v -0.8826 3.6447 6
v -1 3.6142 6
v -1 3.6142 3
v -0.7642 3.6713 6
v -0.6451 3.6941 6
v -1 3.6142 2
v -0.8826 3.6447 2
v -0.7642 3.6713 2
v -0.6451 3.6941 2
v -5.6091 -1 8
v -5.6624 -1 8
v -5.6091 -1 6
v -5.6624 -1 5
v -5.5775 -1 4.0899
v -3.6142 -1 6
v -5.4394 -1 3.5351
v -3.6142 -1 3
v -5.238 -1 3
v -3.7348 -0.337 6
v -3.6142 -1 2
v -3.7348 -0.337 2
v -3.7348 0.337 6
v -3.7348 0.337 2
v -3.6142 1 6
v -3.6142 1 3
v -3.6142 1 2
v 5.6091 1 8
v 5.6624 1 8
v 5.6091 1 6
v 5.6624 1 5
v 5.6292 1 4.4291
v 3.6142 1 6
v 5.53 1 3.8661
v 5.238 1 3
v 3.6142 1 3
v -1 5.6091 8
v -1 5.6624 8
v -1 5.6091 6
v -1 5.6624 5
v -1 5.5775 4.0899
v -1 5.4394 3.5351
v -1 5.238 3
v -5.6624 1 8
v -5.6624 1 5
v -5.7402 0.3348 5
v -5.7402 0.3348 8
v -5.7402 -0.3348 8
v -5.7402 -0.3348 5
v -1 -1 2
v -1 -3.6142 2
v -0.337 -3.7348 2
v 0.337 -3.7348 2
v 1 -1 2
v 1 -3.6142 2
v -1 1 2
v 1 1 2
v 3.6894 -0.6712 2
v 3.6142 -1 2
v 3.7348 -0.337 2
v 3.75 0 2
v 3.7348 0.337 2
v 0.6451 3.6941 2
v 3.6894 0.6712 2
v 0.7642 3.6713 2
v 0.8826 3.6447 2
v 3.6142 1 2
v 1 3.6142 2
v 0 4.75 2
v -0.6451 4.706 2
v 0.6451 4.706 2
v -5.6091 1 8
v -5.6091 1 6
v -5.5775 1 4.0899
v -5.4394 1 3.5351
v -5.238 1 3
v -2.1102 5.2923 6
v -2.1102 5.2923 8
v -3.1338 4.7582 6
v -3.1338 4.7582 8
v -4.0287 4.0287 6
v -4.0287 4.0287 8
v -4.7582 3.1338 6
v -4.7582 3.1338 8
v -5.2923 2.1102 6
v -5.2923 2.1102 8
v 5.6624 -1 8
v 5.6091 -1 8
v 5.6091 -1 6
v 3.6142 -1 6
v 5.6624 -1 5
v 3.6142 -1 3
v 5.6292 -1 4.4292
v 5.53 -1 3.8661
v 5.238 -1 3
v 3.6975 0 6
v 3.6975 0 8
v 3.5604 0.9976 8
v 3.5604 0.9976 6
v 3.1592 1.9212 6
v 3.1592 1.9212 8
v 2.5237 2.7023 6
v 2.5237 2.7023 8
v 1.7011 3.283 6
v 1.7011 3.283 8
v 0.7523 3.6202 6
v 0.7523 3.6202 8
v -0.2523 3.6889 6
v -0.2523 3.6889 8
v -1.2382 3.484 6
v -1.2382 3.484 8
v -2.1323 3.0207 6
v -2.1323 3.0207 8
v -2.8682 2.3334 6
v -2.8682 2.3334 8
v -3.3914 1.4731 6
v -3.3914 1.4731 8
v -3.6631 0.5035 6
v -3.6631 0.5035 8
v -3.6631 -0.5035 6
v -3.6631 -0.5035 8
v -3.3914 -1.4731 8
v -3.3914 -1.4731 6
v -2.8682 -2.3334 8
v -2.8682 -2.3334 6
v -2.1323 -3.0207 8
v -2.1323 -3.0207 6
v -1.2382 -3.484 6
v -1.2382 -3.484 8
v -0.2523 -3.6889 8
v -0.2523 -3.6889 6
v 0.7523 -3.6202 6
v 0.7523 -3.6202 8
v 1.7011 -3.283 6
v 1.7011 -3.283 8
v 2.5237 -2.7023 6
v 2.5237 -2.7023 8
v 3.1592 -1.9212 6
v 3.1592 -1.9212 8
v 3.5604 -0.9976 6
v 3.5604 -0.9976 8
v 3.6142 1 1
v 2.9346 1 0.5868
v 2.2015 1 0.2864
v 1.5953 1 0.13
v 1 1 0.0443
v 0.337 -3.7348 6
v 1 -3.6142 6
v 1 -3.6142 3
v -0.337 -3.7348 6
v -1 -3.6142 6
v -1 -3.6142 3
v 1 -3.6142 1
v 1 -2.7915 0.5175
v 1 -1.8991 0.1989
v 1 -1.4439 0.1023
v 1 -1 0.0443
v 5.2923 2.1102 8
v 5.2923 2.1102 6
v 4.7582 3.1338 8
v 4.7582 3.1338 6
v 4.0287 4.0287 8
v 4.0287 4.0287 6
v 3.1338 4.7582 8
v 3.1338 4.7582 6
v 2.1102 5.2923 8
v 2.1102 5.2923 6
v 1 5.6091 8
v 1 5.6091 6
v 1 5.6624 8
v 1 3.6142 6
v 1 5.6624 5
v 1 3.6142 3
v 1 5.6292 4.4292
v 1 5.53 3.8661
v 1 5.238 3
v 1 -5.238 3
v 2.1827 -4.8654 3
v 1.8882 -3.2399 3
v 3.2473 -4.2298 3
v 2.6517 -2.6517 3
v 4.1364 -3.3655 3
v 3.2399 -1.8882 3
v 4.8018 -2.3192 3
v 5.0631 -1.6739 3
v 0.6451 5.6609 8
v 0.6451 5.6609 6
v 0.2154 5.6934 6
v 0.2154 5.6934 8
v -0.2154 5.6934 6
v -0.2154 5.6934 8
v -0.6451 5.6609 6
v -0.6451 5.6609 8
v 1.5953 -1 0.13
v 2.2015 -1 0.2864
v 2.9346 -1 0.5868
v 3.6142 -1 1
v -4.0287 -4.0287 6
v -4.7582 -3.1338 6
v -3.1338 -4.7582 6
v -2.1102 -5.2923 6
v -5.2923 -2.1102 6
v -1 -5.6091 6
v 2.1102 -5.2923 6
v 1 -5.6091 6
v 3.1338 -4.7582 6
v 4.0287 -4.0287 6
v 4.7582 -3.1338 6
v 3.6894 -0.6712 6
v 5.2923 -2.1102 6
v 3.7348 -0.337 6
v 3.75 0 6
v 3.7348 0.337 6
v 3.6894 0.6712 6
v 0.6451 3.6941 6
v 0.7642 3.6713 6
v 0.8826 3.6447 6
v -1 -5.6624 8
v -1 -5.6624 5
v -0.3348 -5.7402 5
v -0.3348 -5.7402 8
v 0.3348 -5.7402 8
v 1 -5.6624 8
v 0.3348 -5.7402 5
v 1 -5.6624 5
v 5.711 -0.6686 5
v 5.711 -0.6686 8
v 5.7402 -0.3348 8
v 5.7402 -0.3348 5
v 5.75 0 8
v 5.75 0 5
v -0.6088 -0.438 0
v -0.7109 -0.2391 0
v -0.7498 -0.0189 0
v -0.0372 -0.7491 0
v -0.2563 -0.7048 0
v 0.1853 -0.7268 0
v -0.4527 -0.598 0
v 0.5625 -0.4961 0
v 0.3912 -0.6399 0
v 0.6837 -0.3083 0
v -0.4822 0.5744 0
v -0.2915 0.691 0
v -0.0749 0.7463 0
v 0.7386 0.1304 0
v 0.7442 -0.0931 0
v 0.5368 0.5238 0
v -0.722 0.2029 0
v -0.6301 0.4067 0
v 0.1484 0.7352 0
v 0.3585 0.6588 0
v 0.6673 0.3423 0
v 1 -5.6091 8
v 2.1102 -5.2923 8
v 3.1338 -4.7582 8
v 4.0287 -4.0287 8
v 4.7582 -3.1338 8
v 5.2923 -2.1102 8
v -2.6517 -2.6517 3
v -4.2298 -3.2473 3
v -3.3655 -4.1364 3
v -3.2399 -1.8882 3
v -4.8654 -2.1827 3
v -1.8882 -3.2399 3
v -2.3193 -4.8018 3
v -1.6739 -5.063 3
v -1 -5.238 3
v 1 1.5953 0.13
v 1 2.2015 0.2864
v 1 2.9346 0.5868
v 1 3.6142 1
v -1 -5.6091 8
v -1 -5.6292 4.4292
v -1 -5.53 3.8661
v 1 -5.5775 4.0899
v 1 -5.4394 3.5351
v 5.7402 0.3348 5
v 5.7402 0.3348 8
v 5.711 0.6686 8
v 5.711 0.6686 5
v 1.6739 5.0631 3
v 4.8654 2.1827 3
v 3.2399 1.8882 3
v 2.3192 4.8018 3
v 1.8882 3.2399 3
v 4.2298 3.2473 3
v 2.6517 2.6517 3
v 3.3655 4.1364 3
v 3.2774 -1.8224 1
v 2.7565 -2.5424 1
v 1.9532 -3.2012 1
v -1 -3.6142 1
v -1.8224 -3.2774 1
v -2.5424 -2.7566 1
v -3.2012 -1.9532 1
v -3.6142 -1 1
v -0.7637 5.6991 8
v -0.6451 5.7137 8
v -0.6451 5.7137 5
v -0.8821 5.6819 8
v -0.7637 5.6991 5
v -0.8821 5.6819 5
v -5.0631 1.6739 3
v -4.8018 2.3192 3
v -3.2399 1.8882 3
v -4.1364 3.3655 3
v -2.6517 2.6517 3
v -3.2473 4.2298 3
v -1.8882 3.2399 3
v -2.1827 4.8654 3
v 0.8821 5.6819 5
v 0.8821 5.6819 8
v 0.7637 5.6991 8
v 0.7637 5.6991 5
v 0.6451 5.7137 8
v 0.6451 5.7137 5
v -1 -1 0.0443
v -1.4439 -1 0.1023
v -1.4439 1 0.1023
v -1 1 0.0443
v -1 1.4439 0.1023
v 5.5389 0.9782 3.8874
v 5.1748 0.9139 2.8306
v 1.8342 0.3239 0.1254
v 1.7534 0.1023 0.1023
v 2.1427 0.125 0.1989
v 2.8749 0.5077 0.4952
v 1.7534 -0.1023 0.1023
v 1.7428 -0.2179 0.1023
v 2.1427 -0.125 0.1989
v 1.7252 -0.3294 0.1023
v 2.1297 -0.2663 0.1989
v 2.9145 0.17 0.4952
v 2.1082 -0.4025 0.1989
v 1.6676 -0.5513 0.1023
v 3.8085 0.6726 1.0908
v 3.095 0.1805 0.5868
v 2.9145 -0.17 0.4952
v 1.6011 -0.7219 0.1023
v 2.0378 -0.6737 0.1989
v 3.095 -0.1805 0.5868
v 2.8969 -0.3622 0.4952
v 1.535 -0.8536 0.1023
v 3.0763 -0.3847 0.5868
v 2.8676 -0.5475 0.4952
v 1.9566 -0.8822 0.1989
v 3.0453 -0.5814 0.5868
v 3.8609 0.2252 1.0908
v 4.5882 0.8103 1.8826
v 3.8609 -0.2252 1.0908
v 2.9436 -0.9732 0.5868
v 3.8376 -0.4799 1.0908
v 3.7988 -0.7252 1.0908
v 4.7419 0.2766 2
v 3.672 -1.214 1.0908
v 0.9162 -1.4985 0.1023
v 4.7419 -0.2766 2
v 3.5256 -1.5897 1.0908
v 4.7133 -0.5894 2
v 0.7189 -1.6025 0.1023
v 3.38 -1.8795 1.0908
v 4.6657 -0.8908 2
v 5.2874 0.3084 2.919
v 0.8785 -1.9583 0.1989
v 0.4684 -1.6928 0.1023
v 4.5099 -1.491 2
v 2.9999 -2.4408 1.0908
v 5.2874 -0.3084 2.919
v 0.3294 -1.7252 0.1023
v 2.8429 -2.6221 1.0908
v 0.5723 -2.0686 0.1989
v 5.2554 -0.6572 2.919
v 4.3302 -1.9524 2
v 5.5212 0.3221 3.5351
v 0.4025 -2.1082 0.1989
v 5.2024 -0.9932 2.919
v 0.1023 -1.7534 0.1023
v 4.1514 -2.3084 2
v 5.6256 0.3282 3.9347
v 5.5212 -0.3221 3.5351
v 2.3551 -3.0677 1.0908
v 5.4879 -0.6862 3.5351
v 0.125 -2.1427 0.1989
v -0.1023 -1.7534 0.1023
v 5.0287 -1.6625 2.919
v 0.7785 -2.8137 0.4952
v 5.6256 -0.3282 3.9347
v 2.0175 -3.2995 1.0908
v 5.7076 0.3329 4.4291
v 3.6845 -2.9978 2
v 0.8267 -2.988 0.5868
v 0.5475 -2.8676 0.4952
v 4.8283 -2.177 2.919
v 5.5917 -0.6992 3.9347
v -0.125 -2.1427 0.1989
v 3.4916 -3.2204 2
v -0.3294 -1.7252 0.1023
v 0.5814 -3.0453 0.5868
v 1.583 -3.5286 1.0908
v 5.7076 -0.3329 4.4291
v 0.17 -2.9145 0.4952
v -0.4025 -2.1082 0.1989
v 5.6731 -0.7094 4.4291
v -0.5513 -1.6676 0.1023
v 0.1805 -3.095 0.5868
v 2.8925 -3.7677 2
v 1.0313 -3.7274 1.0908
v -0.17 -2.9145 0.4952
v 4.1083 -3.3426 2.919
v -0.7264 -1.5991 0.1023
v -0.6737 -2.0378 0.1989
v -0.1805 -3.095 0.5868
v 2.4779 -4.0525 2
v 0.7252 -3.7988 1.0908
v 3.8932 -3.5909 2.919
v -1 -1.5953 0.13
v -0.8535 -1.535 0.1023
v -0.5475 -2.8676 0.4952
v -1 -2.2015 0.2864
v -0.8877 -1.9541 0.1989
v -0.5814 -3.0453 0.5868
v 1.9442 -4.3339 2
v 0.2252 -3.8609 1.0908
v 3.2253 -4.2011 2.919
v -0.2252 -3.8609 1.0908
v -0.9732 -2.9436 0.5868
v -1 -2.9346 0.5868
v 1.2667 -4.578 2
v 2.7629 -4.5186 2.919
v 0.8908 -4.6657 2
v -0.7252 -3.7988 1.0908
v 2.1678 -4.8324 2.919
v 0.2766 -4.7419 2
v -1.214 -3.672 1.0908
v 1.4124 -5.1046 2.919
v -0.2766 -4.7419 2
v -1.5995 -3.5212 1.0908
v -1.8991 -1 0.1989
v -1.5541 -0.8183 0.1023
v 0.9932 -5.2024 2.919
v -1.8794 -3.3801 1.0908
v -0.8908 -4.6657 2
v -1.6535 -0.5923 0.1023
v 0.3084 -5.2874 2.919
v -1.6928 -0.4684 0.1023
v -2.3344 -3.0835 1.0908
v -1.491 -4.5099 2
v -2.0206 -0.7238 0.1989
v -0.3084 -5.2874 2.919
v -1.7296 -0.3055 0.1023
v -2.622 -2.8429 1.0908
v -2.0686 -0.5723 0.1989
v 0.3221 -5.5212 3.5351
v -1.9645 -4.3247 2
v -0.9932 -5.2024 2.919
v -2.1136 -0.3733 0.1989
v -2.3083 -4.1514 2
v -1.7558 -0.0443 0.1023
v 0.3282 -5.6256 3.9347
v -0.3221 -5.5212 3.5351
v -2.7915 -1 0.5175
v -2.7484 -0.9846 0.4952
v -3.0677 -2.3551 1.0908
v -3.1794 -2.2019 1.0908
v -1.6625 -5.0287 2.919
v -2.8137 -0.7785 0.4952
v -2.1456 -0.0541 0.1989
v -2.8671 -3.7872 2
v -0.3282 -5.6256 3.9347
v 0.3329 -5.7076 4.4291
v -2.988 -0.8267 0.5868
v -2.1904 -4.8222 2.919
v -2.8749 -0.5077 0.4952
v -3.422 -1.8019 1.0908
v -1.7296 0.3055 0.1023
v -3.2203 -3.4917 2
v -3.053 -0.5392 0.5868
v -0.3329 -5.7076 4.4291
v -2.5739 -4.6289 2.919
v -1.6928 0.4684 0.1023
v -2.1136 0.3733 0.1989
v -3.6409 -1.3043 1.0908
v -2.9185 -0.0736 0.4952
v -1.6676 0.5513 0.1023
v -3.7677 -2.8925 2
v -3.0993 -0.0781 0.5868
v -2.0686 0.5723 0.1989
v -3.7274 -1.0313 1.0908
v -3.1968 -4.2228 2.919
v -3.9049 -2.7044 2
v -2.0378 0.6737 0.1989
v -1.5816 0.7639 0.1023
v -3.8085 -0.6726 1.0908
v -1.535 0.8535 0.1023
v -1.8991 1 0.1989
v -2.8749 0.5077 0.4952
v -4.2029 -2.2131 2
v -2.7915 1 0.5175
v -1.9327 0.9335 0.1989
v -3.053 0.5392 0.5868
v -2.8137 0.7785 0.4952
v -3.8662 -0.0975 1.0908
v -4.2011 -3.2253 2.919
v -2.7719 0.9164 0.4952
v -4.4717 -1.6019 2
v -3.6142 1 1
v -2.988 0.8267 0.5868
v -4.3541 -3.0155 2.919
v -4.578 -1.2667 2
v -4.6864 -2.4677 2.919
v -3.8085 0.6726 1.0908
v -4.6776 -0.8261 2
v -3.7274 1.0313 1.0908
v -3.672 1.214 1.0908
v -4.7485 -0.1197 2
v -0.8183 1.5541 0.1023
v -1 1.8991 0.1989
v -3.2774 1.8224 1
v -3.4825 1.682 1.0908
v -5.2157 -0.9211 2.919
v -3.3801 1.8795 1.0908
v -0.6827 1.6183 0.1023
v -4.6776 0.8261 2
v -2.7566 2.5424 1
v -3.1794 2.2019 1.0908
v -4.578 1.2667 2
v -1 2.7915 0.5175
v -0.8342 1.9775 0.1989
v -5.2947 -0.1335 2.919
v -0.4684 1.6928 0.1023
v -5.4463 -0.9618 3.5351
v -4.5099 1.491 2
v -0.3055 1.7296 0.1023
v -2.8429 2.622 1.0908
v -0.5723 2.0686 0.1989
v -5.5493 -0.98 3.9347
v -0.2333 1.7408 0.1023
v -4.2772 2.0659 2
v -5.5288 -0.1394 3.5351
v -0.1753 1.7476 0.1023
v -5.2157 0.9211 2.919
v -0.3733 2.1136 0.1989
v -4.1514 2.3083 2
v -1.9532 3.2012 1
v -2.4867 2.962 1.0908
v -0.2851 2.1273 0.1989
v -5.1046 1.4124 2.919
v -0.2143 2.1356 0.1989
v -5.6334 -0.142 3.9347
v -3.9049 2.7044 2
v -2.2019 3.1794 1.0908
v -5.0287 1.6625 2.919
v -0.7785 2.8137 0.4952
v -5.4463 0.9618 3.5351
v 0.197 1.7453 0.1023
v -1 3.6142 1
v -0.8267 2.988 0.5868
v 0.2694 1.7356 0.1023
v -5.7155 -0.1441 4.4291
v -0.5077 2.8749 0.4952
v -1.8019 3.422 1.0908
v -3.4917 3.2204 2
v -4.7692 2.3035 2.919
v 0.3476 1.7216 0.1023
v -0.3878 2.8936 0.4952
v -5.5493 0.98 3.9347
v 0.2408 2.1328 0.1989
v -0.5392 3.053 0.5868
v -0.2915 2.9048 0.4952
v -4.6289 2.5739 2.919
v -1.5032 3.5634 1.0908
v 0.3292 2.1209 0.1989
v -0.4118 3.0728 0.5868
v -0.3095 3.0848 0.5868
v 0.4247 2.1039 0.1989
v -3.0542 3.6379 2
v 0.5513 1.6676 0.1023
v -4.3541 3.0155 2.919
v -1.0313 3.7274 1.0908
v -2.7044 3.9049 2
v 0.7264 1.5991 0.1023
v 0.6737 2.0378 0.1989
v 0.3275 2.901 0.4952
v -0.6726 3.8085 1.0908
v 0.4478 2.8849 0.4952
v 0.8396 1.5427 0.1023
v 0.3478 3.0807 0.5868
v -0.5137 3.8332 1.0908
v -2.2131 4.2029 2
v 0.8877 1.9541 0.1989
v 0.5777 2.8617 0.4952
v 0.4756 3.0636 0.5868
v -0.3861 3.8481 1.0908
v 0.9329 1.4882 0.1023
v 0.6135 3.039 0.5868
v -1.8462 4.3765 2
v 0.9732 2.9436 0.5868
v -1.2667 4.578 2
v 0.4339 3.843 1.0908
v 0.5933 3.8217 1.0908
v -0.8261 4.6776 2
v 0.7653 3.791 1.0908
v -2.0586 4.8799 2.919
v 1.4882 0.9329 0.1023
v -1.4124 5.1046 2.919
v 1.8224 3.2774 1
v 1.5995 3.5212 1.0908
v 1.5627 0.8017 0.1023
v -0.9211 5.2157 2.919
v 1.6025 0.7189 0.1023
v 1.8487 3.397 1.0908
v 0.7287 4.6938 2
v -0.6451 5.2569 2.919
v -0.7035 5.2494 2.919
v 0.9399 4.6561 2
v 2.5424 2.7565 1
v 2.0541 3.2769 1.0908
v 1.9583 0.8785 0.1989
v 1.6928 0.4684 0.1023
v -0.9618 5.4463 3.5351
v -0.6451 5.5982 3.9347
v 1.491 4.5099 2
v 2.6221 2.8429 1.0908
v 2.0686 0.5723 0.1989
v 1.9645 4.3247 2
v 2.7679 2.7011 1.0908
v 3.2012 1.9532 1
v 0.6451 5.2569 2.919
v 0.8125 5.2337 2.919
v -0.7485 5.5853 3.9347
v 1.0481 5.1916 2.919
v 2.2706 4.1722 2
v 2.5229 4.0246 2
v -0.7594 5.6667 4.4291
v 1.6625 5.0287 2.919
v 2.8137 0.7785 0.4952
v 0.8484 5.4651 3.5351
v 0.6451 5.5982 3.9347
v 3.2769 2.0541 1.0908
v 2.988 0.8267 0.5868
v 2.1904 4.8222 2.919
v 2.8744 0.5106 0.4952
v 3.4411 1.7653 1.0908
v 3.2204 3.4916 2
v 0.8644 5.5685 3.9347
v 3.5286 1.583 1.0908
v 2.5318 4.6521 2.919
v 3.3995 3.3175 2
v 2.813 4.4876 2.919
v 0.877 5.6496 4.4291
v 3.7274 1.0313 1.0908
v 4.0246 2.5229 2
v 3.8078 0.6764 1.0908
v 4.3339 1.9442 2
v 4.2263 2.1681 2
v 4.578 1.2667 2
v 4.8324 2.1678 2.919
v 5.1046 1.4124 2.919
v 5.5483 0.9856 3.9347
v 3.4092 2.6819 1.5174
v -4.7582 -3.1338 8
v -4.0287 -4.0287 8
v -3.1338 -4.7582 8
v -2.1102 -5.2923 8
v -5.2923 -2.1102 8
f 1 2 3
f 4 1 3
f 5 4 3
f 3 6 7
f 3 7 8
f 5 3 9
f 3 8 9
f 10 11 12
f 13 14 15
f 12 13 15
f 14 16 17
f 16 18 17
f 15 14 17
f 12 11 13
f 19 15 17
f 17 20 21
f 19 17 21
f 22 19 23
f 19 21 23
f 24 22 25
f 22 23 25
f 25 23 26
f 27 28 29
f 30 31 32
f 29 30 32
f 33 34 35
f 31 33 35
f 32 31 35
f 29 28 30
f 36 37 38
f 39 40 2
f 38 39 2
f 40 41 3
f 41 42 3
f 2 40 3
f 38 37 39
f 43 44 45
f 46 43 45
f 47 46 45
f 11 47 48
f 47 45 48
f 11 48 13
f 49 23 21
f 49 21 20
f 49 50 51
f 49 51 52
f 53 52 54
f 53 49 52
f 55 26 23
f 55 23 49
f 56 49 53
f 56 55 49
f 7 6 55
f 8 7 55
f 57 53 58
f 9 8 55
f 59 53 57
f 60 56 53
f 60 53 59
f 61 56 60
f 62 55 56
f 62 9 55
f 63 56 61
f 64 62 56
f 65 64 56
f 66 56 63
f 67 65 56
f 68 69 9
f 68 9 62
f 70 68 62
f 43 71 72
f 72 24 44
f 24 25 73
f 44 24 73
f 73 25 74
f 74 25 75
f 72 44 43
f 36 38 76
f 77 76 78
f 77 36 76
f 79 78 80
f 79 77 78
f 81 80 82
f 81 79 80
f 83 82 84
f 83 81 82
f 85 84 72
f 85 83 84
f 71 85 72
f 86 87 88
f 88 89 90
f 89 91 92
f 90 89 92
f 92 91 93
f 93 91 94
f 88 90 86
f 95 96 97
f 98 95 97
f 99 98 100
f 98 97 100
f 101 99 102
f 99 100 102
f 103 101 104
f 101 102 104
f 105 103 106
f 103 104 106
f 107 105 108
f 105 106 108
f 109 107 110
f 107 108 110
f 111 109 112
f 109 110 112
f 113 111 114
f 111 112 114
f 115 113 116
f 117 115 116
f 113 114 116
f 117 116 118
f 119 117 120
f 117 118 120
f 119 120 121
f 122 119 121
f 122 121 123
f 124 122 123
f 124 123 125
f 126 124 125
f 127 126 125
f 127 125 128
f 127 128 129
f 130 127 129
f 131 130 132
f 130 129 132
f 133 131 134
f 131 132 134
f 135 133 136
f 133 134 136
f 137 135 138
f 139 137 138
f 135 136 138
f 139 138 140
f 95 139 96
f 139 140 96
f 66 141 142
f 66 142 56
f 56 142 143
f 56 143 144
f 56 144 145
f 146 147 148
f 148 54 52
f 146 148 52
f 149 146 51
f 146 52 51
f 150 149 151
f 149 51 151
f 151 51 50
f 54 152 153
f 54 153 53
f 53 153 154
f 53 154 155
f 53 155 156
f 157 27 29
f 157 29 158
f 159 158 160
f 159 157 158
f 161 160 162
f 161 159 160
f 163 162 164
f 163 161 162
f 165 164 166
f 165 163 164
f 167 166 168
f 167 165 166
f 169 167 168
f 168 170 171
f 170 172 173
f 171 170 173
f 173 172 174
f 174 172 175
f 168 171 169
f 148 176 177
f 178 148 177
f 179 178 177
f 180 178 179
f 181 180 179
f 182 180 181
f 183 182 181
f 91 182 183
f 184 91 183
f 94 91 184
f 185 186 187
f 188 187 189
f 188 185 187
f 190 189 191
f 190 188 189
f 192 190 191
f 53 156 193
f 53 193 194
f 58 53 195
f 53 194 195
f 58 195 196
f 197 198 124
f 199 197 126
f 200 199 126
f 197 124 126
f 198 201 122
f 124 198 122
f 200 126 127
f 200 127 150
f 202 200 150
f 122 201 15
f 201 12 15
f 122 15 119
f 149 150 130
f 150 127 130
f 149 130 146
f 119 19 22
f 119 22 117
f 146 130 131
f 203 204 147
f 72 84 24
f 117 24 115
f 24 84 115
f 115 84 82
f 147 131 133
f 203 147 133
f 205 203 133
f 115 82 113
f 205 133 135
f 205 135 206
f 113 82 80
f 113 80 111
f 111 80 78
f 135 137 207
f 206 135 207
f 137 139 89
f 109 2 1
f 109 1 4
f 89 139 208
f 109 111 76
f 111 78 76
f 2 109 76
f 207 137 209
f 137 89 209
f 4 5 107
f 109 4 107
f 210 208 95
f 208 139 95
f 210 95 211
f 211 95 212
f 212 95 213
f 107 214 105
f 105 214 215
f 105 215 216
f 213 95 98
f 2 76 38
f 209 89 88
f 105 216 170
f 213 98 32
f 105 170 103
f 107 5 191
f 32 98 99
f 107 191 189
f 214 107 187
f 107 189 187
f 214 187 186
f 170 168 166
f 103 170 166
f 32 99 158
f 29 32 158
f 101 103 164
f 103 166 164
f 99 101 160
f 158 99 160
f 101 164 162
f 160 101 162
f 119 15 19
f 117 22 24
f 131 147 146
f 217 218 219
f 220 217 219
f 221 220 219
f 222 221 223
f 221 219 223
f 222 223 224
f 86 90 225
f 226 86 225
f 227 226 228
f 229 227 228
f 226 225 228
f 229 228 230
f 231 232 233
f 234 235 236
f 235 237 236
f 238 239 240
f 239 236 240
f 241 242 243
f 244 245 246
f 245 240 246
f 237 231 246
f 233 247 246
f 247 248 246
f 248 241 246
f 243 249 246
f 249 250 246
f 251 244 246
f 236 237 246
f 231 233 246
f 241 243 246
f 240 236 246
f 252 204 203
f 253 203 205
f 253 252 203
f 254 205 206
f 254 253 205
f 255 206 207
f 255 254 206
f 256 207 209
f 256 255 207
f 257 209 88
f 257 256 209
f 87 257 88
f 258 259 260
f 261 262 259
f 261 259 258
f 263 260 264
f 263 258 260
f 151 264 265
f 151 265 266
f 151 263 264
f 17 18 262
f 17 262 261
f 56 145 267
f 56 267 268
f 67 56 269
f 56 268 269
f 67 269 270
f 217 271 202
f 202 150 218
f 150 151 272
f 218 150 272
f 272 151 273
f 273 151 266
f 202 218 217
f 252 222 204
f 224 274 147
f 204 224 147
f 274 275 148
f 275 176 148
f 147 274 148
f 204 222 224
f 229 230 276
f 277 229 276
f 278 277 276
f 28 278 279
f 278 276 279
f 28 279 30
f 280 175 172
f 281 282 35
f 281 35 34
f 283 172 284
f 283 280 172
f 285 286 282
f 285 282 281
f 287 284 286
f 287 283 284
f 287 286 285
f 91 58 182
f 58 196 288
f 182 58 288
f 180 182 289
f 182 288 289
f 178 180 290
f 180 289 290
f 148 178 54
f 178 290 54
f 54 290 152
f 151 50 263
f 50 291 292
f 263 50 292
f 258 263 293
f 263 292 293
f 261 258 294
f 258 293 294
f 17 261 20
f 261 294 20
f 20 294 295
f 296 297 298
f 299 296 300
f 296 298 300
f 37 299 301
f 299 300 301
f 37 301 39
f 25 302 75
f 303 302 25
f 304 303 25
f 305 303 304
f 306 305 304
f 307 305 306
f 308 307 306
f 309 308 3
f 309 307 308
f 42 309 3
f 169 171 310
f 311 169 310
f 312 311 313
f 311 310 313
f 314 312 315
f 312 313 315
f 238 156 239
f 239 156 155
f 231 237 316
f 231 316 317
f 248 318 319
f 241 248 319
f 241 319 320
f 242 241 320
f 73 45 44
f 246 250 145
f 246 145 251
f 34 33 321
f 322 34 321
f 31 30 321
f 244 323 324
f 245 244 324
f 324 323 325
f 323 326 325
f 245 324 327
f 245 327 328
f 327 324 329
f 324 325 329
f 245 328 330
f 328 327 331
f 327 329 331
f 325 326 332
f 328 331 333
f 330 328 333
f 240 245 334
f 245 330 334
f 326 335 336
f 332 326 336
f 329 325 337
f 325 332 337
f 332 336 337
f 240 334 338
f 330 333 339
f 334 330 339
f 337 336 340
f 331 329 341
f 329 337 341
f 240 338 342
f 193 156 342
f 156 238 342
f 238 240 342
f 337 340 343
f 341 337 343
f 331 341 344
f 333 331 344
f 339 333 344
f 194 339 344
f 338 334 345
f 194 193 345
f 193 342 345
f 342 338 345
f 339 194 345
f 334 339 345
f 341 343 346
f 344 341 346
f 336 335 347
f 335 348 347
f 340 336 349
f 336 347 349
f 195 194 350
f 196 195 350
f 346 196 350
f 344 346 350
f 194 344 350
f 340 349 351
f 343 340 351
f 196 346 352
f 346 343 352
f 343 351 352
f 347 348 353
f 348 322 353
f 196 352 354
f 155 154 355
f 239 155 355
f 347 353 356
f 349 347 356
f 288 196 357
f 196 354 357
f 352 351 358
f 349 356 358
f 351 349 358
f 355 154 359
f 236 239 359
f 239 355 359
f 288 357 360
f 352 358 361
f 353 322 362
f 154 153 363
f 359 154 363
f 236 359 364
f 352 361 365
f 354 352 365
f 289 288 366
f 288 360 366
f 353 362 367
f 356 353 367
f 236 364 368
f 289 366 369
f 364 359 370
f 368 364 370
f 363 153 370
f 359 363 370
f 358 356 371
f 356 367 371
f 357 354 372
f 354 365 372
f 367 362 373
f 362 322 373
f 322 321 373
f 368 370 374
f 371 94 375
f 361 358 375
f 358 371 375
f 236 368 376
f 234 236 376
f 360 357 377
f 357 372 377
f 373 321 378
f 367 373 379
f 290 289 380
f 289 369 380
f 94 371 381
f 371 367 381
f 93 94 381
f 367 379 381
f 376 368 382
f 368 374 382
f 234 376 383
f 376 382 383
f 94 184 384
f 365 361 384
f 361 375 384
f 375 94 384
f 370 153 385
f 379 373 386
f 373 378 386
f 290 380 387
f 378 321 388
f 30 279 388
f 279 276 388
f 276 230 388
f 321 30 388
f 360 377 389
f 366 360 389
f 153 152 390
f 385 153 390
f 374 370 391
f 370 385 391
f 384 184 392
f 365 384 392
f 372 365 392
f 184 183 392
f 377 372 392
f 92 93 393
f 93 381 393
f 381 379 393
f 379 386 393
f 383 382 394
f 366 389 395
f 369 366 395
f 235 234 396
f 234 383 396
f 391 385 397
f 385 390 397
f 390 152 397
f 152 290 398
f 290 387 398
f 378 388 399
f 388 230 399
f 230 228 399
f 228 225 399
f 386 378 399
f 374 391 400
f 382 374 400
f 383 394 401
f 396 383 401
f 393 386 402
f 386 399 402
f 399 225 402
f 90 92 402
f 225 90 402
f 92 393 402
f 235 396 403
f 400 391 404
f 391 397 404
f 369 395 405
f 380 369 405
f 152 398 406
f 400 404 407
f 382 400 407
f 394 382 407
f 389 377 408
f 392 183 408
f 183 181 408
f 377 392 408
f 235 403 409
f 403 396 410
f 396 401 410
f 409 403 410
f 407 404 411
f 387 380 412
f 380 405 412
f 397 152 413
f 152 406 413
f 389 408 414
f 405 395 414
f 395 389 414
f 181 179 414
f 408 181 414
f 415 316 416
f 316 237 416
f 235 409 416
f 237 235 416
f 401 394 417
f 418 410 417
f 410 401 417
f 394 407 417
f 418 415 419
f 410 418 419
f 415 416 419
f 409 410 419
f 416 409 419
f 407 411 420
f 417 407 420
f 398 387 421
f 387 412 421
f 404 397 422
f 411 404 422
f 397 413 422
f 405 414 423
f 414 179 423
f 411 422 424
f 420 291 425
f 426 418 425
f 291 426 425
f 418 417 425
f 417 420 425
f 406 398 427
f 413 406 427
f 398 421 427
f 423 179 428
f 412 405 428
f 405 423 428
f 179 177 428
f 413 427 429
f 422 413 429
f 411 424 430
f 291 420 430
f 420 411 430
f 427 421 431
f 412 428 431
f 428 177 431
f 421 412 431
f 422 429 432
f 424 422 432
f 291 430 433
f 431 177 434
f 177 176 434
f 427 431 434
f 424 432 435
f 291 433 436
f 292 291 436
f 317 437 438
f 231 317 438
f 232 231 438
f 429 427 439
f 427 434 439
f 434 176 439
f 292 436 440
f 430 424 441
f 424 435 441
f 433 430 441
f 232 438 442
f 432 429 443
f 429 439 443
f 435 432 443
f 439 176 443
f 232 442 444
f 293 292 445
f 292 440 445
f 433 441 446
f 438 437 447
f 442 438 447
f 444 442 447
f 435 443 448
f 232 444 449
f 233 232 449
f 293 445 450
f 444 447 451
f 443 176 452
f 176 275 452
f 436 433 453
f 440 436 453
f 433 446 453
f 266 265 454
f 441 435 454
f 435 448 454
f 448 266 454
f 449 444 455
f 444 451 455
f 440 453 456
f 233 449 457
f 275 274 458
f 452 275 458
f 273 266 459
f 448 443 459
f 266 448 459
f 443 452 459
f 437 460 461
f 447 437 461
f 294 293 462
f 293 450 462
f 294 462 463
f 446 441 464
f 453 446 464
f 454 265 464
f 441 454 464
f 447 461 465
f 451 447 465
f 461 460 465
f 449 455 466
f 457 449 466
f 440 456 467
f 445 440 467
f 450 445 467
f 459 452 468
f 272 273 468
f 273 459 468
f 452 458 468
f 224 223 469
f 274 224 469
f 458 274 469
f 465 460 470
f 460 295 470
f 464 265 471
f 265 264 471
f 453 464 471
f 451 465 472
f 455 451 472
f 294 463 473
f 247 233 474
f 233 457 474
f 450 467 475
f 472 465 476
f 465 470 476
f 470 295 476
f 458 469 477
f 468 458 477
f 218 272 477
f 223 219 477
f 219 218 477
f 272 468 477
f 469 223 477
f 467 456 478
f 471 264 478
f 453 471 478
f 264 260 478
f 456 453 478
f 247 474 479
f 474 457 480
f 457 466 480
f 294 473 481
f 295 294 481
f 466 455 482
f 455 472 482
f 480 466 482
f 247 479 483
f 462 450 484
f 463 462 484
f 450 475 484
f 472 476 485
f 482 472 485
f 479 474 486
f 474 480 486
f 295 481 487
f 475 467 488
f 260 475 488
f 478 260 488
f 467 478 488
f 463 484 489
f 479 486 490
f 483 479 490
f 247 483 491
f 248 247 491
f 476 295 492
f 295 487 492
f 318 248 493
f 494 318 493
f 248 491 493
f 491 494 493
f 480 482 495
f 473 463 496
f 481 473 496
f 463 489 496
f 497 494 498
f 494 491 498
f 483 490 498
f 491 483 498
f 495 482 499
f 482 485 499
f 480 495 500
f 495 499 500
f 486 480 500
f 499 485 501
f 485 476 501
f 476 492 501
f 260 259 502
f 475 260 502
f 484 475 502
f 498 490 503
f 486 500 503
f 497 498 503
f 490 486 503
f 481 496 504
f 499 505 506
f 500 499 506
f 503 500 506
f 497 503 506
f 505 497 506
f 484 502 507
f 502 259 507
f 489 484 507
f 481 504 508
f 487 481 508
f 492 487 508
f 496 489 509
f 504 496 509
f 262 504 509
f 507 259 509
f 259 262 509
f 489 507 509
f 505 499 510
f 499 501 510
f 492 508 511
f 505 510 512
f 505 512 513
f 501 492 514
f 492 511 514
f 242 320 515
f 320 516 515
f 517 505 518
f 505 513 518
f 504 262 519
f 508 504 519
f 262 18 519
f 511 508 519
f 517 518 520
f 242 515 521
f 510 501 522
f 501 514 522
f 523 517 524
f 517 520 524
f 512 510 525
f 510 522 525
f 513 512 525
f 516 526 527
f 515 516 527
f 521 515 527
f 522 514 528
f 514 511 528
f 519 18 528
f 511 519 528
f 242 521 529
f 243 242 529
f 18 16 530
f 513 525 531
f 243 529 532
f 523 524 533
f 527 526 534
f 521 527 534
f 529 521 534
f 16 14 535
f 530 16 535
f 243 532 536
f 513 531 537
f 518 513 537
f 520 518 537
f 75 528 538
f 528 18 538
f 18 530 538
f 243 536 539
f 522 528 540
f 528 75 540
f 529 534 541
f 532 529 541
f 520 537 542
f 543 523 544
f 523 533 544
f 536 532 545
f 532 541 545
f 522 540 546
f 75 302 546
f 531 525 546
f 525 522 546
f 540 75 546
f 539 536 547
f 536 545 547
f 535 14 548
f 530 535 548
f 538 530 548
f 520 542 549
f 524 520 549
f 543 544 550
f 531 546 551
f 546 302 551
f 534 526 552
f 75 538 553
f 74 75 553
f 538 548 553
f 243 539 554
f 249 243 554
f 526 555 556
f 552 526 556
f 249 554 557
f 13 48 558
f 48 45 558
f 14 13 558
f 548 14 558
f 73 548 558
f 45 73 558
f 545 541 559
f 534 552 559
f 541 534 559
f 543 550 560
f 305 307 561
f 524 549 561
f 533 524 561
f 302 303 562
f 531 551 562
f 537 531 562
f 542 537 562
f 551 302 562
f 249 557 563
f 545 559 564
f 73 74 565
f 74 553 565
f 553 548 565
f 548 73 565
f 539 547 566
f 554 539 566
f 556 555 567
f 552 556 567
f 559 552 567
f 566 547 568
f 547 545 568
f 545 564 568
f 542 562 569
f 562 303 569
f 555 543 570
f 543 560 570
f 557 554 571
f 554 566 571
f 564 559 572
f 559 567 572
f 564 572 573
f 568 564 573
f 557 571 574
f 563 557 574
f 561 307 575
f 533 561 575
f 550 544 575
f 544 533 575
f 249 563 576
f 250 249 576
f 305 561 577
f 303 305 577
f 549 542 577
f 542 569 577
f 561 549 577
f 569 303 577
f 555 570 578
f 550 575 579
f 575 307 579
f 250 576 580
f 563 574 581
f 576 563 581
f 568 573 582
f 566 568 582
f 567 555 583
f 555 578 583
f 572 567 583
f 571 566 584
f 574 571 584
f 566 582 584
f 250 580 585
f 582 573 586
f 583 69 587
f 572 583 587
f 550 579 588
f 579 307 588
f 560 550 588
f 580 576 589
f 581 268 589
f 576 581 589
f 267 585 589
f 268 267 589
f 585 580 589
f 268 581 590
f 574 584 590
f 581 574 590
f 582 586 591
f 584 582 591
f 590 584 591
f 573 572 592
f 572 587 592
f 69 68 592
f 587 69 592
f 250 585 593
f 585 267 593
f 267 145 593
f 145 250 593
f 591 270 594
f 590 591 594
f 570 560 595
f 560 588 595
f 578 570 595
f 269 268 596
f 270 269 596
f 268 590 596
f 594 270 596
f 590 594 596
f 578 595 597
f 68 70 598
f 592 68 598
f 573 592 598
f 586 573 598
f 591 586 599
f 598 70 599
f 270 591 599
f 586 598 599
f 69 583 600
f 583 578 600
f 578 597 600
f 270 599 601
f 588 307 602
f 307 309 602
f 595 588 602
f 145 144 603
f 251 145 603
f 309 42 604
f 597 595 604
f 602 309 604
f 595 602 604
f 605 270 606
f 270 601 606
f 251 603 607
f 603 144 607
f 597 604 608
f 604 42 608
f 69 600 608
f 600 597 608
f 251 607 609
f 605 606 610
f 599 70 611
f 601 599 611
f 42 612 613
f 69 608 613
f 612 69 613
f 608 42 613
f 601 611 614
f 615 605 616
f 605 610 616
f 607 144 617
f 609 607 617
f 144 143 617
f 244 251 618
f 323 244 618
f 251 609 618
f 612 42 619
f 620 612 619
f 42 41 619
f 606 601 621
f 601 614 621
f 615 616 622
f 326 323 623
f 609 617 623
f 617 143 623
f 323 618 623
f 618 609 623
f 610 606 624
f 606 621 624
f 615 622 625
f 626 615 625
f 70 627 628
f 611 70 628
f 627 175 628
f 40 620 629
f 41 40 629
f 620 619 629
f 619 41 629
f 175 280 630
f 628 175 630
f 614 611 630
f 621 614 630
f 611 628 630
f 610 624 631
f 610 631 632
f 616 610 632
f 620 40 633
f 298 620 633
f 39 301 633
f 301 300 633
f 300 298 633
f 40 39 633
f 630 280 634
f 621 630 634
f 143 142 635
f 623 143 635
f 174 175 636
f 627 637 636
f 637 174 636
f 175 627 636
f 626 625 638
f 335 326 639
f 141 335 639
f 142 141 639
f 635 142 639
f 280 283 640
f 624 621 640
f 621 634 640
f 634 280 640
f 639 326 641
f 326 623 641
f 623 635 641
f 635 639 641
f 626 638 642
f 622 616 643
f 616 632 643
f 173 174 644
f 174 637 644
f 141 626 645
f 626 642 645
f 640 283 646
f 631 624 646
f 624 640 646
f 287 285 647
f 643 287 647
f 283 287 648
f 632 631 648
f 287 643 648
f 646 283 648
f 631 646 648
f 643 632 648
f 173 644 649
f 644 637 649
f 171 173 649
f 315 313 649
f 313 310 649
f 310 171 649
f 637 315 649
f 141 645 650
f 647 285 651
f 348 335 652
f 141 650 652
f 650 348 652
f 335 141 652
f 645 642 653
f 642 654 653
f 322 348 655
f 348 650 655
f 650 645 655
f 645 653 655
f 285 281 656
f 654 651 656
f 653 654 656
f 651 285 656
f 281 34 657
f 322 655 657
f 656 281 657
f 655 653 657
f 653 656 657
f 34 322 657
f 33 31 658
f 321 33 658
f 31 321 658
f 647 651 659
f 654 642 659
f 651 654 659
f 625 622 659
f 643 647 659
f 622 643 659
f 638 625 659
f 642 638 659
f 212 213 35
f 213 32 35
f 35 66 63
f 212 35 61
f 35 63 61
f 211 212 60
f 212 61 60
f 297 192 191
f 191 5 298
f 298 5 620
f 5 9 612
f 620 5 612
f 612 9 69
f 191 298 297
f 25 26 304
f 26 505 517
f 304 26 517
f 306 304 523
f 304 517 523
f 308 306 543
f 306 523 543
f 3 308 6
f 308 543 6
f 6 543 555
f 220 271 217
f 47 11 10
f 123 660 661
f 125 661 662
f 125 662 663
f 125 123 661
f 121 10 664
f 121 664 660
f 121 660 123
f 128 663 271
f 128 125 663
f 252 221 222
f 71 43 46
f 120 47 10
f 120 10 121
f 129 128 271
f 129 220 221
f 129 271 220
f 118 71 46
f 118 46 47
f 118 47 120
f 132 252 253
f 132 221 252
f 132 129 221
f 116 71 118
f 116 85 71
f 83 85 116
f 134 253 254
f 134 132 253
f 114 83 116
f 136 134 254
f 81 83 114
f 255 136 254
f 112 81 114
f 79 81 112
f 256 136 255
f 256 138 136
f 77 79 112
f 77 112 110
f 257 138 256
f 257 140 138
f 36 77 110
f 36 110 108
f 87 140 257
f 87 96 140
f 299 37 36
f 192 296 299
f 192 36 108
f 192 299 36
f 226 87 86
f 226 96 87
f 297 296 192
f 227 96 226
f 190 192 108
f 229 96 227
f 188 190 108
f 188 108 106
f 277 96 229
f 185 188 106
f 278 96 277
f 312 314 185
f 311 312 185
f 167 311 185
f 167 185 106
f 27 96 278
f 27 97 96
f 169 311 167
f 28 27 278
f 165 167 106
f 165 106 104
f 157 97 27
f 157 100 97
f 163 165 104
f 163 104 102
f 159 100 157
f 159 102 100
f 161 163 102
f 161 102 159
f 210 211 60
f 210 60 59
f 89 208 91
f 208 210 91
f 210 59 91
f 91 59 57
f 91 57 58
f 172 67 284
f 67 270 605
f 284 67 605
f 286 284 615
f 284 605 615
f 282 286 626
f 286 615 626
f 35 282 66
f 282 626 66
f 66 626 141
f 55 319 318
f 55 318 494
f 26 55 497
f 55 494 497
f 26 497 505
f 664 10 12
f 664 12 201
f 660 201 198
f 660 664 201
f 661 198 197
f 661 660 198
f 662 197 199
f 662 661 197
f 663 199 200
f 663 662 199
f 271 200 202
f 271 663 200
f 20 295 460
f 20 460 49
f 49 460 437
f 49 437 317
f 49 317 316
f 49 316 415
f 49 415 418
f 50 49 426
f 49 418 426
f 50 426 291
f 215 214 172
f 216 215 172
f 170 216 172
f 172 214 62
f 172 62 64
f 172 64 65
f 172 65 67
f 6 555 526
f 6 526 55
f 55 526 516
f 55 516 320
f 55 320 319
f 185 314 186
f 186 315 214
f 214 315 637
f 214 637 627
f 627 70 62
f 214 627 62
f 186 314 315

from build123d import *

# Parameters (mm, degrees)
F1_DEPTH = 3
F2_DEPTH = 8
F0_W     = 2
F0_H     = 2
F3_DEPTH = 2
F4_R     = 3.6974991887
F5_DEPTH = 2


# Not quite as in the source:
# - a fillet or chamfer that OpenCascade refuses, or shapes differently, is made with other operations: its cross-section is extruded or revolved along the edge and cut away or added


with BuildPart() as f1:
    # F0 (on Top) → F1 (new body)
    with BuildSketch(Plane.XY):
        with BuildLine():
            Line((3.7669987963, -1), (3.6142080737, -1))
            ThreePointArc((3.6142080737, -1), (2.6516504294, -2.6516504294), (1, -3.6142080737))
            Line((1, -3.6142080737), (1, -5.6623758265))
            ThreePointArc((1, -5.6623758265), (4.0658639918, -4.0658639918), (5.6623758265, -1))
            Line((5.6623758265, -1), (3.7669987963, -1))
        make_face()
    extrude(amount=F1_DEPTH)



with BuildPart() as f1b:
    # F0 (on Top) → F1, piece 2 (new body)
    with BuildSketch(Plane.XY):
        with BuildLine():
            Line((-1, -5.6623758265), (-1, -3.6142080737))
            ThreePointArc((-1, -3.6142080737), (-2.6516504294, -2.6516504294), (-3.6142080737, -1))
            Line((-3.6142080737, -1), (-5.6623758265, -1))
            ThreePointArc((-5.6623758265, -1), (-4.0658639918, -4.0658639918), (-1, -5.6623758265))
        make_face()
    extrude(amount=F1_DEPTH)


with BuildPart() as f1c:
    # F0 (on Top) → F1, piece 3 (new body)
    with BuildSketch(Plane.XY):
        with BuildLine():
            ThreePointArc((-3.6142080737, 1), (-2.6516504294, 2.6516504294), (-1, 3.6142080737))
            Line((-1, 3.6142080737), (-1, 5.6623758265))
            ThreePointArc((-1, 5.6623758265), (-4.0658639918, 4.0658639918), (-5.6623758265, 1))
            Line((-5.6623758265, 1), (-3.6142080737, 1))
        make_face()
    extrude(amount=F1_DEPTH)


with BuildPart() as f1d:
    # F0 (on Top) → F1, piece 4 (new body)
    with BuildSketch(Plane.XY):
        with BuildLine():
            ThreePointArc((1, 3.6142080737), (2.6516504294, 2.6516504294), (3.6142080737, 1))
            Line((3.6142080737, 1), (5.6623758265, 1))
            ThreePointArc((5.6623758265, 1), (4.0658639918, 4.0658639918), (1, 5.6623758265))
            Line((1, 5.6623758265), (1, 3.6142080737))
        make_face()
    extrude(amount=F1_DEPTH)


with BuildPart() as f1_1:
    add(f1.part)

    add(f1b.part)  # F2 merges F1b

    add(f1c.part)  # F2 merges F1c

    add(f1d.part)  # F2 merges F1d
    # F0 (on Top) → F2 (join)
    with BuildSketch(Plane.XY):
        with BuildLine():
            ThreePointArc((0.6450651563, 3.6941021838), (0.8235020396, 3.6584620253), (1, 3.6142080737))
            Line((1, 3.6142080737), (1, 5.6623758265))
            ThreePointArc((1, 5.6623758265), (0.8229328266, 5.6908067585), (0.6450651563, 5.7137020349))
            Line((0.6450651563, 5.7137020349), (0.6450651563, 3.6941021838))
        make_face()
        with BuildLine():
            ThreePointArc((-1, 3.6142080737), (-0.8235020396, 3.6584620253), (-0.6450651563, 3.6941021838))
            Line((-0.6450651563, 3.6941021838), (-0.6450651563, 5.7137020349))
            ThreePointArc((-0.6450651563, 5.7137020349), (-0.8229328266, 5.6908067585), (-1, 5.6623758265))
            Line((-1, 5.6623758265), (-1, 3.6142080737))
        make_face()
        with BuildLine():
            ThreePointArc((-3.6142080737, -1), (-3.75, 0), (-3.6142080737, 1))
            Line((-3.6142080737, 1), (-5.6623758265, 1))
            ThreePointArc((-5.6623758265, 1), (-5.75, 0), (-5.6623758265, -1))
            Line((-5.6623758265, -1), (-3.6142080737, -1))
        make_face()
        with BuildLine():
            ThreePointArc((3.6142080737, 1), (3.7158969493, 0.5045888047), (3.75, 0))
            ThreePointArc((3.75, 0), (3.7158969493, -0.5045888047), (3.6142080737, -1))
            Line((3.6142080737, -1), (3.7669987963, -1))
            Line((3.7669987963, -1), (5.6623758265, -1))
            ThreePointArc((5.6623758265, -1), (5.7280520686, -0.5019158285), (5.75, 0))
            ThreePointArc((5.75, 0), (5.7280520686, 0.5019158285), (5.6623758265, 1))
            Line((5.6623758265, 1), (3.6142080737, 1))
        make_face()
        with BuildLine():
            Line((1, -5.6623758265), (1, -3.6142080737))
            ThreePointArc((1, -3.6142080737), (0, -3.75), (-1, -3.6142080737))
            Line((-1, -3.6142080737), (-1, -5.6623758265))
            ThreePointArc((-1, -5.6623758265), (0, -5.75), (1, -5.6623758265))
        make_face()
    extrude(amount=F2_DEPTH)

    # F0 (on Top) → F3 (join)
    with BuildSketch(Plane.XY):
        with BuildLine():
            ThreePointArc((-0.6450651563, 3.6941021838), (0, 3.75), (0.6450651563, 3.6941021838))
            Line((0.6450651563, 3.6941021838), (0.6450651563, 5.7137020349))
            ThreePointArc((0.6450651563, 5.7137020349), (0, 5.75), (-0.6450651563, 5.7137020349))
            Line((-0.6450651563, 5.7137020349), (-0.6450651563, 3.6941021838))
        make_face()
        with BuildLine():
            Line((0.6450651563, 3.1745089218), (0.6450651563, 3.6941021838))
            ThreePointArc((0.6450651563, 3.6941021838), (0, 3.75), (-0.6450651563, 3.6941021838))
            Line((-0.6450651563, 3.6941021838), (-0.6450651563, 3.1745089218))
            Line((-0.6450651563, 3.1745089218), (0.6450651563, 3.1745089218))
        make_face()
        with BuildLine():
            Line((1, 1), (1, 3.6142080737))
            ThreePointArc((1, 3.6142080737), (0.8235020396, 3.6584620253), (0.6450651563, 3.6941021838))
            Line((0.6450651563, 3.6941021838), (0.6450651563, 3.1745089218))
            Line((0.6450651563, 3.1745089218), (-0.6450651563, 3.1745089218))
            Line((-0.6450651563, 3.1745089218), (-0.6450651563, 3.6941021838))
            ThreePointArc((-0.6450651563, 3.6941021838), (-0.8235020396, 3.6584620253), (-1, 3.6142080737))
            Line((-1, 3.6142080737), (-1, 1))
            Line((-1, 1), (1, 1))
        make_face()
        with BuildLine():
            Line((-1, -1), (-1, 1))
            Line((-1, 1), (-3.6142080737, 1))
            ThreePointArc((-3.6142080737, 1), (-3.75, 0), (-3.6142080737, -1))
            Line((-3.6142080737, -1), (-1, -1))
        make_face()
        with BuildLine():
            ThreePointArc((3.6142080737, -1), (3.7158969493, -0.5045888047), (3.75, 0))
            ThreePointArc((3.75, 0), (3.7158969493, 0.5045888047), (3.6142080737, 1))
            Line((3.6142080737, 1), (1, 1))
            Line((1, 1), (1, -1))
            Line((1, -1), (3.6142080737, -1))
        make_face()
        Rectangle(F0_W, F0_H)
        with BuildLine():
            ThreePointArc((-1, -3.6142080737), (0, -3.75), (1, -3.6142080737))
            Line((1, -3.6142080737), (1, -1))
            Line((1, -1), (-1, -1))
            Line((-1, -1), (-1, -3.6142080737))
        make_face()
    extrude(amount=F3_DEPTH)

    # F4 (on face) → F5 (join)
    with BuildSketch(Plane.XY.offset(8)):
        with BuildLine():
            Line((3.6142080737, 1), (5.609054912, 1))
            ThreePointArc((5.609054912, 1), (-5.6974991887, 0), (5.609054912, -1))
            Line((5.609054912, -1), (3.6142080737, -1))
            ThreePointArc((3.6142080737, -1), (3.75, 0), (3.6142080737, 1))
        make_face()
        Circle(F4_R, mode=Mode.SUBTRACT)
    extrude(amount=-F5_DEPTH)

    # F6: fillet of radius 5 on 1 edges, made by hand

    # F6_s1 → F6_t2 (revolve, cut)
    with BuildSketch(Plane(origin=(0, 0, 0), x_dir=(0, 0, 1), z_dir=(-0.1739130435, 0.9847610133, 0))):
        with BuildLine():
            ThreePointArc((0, 0.75), (1.4644660941, 4.2855339059), (5, 5.75))
            Line((5, 5.75), (0, 5.75))
            Line((0, 5.75), (0, 0.75))
        make_face()
    revolve(axis=Axis((0, 0, 0), (0, 0, -1)), mode=Mode.SUBTRACT)


solid = f1_1.part
